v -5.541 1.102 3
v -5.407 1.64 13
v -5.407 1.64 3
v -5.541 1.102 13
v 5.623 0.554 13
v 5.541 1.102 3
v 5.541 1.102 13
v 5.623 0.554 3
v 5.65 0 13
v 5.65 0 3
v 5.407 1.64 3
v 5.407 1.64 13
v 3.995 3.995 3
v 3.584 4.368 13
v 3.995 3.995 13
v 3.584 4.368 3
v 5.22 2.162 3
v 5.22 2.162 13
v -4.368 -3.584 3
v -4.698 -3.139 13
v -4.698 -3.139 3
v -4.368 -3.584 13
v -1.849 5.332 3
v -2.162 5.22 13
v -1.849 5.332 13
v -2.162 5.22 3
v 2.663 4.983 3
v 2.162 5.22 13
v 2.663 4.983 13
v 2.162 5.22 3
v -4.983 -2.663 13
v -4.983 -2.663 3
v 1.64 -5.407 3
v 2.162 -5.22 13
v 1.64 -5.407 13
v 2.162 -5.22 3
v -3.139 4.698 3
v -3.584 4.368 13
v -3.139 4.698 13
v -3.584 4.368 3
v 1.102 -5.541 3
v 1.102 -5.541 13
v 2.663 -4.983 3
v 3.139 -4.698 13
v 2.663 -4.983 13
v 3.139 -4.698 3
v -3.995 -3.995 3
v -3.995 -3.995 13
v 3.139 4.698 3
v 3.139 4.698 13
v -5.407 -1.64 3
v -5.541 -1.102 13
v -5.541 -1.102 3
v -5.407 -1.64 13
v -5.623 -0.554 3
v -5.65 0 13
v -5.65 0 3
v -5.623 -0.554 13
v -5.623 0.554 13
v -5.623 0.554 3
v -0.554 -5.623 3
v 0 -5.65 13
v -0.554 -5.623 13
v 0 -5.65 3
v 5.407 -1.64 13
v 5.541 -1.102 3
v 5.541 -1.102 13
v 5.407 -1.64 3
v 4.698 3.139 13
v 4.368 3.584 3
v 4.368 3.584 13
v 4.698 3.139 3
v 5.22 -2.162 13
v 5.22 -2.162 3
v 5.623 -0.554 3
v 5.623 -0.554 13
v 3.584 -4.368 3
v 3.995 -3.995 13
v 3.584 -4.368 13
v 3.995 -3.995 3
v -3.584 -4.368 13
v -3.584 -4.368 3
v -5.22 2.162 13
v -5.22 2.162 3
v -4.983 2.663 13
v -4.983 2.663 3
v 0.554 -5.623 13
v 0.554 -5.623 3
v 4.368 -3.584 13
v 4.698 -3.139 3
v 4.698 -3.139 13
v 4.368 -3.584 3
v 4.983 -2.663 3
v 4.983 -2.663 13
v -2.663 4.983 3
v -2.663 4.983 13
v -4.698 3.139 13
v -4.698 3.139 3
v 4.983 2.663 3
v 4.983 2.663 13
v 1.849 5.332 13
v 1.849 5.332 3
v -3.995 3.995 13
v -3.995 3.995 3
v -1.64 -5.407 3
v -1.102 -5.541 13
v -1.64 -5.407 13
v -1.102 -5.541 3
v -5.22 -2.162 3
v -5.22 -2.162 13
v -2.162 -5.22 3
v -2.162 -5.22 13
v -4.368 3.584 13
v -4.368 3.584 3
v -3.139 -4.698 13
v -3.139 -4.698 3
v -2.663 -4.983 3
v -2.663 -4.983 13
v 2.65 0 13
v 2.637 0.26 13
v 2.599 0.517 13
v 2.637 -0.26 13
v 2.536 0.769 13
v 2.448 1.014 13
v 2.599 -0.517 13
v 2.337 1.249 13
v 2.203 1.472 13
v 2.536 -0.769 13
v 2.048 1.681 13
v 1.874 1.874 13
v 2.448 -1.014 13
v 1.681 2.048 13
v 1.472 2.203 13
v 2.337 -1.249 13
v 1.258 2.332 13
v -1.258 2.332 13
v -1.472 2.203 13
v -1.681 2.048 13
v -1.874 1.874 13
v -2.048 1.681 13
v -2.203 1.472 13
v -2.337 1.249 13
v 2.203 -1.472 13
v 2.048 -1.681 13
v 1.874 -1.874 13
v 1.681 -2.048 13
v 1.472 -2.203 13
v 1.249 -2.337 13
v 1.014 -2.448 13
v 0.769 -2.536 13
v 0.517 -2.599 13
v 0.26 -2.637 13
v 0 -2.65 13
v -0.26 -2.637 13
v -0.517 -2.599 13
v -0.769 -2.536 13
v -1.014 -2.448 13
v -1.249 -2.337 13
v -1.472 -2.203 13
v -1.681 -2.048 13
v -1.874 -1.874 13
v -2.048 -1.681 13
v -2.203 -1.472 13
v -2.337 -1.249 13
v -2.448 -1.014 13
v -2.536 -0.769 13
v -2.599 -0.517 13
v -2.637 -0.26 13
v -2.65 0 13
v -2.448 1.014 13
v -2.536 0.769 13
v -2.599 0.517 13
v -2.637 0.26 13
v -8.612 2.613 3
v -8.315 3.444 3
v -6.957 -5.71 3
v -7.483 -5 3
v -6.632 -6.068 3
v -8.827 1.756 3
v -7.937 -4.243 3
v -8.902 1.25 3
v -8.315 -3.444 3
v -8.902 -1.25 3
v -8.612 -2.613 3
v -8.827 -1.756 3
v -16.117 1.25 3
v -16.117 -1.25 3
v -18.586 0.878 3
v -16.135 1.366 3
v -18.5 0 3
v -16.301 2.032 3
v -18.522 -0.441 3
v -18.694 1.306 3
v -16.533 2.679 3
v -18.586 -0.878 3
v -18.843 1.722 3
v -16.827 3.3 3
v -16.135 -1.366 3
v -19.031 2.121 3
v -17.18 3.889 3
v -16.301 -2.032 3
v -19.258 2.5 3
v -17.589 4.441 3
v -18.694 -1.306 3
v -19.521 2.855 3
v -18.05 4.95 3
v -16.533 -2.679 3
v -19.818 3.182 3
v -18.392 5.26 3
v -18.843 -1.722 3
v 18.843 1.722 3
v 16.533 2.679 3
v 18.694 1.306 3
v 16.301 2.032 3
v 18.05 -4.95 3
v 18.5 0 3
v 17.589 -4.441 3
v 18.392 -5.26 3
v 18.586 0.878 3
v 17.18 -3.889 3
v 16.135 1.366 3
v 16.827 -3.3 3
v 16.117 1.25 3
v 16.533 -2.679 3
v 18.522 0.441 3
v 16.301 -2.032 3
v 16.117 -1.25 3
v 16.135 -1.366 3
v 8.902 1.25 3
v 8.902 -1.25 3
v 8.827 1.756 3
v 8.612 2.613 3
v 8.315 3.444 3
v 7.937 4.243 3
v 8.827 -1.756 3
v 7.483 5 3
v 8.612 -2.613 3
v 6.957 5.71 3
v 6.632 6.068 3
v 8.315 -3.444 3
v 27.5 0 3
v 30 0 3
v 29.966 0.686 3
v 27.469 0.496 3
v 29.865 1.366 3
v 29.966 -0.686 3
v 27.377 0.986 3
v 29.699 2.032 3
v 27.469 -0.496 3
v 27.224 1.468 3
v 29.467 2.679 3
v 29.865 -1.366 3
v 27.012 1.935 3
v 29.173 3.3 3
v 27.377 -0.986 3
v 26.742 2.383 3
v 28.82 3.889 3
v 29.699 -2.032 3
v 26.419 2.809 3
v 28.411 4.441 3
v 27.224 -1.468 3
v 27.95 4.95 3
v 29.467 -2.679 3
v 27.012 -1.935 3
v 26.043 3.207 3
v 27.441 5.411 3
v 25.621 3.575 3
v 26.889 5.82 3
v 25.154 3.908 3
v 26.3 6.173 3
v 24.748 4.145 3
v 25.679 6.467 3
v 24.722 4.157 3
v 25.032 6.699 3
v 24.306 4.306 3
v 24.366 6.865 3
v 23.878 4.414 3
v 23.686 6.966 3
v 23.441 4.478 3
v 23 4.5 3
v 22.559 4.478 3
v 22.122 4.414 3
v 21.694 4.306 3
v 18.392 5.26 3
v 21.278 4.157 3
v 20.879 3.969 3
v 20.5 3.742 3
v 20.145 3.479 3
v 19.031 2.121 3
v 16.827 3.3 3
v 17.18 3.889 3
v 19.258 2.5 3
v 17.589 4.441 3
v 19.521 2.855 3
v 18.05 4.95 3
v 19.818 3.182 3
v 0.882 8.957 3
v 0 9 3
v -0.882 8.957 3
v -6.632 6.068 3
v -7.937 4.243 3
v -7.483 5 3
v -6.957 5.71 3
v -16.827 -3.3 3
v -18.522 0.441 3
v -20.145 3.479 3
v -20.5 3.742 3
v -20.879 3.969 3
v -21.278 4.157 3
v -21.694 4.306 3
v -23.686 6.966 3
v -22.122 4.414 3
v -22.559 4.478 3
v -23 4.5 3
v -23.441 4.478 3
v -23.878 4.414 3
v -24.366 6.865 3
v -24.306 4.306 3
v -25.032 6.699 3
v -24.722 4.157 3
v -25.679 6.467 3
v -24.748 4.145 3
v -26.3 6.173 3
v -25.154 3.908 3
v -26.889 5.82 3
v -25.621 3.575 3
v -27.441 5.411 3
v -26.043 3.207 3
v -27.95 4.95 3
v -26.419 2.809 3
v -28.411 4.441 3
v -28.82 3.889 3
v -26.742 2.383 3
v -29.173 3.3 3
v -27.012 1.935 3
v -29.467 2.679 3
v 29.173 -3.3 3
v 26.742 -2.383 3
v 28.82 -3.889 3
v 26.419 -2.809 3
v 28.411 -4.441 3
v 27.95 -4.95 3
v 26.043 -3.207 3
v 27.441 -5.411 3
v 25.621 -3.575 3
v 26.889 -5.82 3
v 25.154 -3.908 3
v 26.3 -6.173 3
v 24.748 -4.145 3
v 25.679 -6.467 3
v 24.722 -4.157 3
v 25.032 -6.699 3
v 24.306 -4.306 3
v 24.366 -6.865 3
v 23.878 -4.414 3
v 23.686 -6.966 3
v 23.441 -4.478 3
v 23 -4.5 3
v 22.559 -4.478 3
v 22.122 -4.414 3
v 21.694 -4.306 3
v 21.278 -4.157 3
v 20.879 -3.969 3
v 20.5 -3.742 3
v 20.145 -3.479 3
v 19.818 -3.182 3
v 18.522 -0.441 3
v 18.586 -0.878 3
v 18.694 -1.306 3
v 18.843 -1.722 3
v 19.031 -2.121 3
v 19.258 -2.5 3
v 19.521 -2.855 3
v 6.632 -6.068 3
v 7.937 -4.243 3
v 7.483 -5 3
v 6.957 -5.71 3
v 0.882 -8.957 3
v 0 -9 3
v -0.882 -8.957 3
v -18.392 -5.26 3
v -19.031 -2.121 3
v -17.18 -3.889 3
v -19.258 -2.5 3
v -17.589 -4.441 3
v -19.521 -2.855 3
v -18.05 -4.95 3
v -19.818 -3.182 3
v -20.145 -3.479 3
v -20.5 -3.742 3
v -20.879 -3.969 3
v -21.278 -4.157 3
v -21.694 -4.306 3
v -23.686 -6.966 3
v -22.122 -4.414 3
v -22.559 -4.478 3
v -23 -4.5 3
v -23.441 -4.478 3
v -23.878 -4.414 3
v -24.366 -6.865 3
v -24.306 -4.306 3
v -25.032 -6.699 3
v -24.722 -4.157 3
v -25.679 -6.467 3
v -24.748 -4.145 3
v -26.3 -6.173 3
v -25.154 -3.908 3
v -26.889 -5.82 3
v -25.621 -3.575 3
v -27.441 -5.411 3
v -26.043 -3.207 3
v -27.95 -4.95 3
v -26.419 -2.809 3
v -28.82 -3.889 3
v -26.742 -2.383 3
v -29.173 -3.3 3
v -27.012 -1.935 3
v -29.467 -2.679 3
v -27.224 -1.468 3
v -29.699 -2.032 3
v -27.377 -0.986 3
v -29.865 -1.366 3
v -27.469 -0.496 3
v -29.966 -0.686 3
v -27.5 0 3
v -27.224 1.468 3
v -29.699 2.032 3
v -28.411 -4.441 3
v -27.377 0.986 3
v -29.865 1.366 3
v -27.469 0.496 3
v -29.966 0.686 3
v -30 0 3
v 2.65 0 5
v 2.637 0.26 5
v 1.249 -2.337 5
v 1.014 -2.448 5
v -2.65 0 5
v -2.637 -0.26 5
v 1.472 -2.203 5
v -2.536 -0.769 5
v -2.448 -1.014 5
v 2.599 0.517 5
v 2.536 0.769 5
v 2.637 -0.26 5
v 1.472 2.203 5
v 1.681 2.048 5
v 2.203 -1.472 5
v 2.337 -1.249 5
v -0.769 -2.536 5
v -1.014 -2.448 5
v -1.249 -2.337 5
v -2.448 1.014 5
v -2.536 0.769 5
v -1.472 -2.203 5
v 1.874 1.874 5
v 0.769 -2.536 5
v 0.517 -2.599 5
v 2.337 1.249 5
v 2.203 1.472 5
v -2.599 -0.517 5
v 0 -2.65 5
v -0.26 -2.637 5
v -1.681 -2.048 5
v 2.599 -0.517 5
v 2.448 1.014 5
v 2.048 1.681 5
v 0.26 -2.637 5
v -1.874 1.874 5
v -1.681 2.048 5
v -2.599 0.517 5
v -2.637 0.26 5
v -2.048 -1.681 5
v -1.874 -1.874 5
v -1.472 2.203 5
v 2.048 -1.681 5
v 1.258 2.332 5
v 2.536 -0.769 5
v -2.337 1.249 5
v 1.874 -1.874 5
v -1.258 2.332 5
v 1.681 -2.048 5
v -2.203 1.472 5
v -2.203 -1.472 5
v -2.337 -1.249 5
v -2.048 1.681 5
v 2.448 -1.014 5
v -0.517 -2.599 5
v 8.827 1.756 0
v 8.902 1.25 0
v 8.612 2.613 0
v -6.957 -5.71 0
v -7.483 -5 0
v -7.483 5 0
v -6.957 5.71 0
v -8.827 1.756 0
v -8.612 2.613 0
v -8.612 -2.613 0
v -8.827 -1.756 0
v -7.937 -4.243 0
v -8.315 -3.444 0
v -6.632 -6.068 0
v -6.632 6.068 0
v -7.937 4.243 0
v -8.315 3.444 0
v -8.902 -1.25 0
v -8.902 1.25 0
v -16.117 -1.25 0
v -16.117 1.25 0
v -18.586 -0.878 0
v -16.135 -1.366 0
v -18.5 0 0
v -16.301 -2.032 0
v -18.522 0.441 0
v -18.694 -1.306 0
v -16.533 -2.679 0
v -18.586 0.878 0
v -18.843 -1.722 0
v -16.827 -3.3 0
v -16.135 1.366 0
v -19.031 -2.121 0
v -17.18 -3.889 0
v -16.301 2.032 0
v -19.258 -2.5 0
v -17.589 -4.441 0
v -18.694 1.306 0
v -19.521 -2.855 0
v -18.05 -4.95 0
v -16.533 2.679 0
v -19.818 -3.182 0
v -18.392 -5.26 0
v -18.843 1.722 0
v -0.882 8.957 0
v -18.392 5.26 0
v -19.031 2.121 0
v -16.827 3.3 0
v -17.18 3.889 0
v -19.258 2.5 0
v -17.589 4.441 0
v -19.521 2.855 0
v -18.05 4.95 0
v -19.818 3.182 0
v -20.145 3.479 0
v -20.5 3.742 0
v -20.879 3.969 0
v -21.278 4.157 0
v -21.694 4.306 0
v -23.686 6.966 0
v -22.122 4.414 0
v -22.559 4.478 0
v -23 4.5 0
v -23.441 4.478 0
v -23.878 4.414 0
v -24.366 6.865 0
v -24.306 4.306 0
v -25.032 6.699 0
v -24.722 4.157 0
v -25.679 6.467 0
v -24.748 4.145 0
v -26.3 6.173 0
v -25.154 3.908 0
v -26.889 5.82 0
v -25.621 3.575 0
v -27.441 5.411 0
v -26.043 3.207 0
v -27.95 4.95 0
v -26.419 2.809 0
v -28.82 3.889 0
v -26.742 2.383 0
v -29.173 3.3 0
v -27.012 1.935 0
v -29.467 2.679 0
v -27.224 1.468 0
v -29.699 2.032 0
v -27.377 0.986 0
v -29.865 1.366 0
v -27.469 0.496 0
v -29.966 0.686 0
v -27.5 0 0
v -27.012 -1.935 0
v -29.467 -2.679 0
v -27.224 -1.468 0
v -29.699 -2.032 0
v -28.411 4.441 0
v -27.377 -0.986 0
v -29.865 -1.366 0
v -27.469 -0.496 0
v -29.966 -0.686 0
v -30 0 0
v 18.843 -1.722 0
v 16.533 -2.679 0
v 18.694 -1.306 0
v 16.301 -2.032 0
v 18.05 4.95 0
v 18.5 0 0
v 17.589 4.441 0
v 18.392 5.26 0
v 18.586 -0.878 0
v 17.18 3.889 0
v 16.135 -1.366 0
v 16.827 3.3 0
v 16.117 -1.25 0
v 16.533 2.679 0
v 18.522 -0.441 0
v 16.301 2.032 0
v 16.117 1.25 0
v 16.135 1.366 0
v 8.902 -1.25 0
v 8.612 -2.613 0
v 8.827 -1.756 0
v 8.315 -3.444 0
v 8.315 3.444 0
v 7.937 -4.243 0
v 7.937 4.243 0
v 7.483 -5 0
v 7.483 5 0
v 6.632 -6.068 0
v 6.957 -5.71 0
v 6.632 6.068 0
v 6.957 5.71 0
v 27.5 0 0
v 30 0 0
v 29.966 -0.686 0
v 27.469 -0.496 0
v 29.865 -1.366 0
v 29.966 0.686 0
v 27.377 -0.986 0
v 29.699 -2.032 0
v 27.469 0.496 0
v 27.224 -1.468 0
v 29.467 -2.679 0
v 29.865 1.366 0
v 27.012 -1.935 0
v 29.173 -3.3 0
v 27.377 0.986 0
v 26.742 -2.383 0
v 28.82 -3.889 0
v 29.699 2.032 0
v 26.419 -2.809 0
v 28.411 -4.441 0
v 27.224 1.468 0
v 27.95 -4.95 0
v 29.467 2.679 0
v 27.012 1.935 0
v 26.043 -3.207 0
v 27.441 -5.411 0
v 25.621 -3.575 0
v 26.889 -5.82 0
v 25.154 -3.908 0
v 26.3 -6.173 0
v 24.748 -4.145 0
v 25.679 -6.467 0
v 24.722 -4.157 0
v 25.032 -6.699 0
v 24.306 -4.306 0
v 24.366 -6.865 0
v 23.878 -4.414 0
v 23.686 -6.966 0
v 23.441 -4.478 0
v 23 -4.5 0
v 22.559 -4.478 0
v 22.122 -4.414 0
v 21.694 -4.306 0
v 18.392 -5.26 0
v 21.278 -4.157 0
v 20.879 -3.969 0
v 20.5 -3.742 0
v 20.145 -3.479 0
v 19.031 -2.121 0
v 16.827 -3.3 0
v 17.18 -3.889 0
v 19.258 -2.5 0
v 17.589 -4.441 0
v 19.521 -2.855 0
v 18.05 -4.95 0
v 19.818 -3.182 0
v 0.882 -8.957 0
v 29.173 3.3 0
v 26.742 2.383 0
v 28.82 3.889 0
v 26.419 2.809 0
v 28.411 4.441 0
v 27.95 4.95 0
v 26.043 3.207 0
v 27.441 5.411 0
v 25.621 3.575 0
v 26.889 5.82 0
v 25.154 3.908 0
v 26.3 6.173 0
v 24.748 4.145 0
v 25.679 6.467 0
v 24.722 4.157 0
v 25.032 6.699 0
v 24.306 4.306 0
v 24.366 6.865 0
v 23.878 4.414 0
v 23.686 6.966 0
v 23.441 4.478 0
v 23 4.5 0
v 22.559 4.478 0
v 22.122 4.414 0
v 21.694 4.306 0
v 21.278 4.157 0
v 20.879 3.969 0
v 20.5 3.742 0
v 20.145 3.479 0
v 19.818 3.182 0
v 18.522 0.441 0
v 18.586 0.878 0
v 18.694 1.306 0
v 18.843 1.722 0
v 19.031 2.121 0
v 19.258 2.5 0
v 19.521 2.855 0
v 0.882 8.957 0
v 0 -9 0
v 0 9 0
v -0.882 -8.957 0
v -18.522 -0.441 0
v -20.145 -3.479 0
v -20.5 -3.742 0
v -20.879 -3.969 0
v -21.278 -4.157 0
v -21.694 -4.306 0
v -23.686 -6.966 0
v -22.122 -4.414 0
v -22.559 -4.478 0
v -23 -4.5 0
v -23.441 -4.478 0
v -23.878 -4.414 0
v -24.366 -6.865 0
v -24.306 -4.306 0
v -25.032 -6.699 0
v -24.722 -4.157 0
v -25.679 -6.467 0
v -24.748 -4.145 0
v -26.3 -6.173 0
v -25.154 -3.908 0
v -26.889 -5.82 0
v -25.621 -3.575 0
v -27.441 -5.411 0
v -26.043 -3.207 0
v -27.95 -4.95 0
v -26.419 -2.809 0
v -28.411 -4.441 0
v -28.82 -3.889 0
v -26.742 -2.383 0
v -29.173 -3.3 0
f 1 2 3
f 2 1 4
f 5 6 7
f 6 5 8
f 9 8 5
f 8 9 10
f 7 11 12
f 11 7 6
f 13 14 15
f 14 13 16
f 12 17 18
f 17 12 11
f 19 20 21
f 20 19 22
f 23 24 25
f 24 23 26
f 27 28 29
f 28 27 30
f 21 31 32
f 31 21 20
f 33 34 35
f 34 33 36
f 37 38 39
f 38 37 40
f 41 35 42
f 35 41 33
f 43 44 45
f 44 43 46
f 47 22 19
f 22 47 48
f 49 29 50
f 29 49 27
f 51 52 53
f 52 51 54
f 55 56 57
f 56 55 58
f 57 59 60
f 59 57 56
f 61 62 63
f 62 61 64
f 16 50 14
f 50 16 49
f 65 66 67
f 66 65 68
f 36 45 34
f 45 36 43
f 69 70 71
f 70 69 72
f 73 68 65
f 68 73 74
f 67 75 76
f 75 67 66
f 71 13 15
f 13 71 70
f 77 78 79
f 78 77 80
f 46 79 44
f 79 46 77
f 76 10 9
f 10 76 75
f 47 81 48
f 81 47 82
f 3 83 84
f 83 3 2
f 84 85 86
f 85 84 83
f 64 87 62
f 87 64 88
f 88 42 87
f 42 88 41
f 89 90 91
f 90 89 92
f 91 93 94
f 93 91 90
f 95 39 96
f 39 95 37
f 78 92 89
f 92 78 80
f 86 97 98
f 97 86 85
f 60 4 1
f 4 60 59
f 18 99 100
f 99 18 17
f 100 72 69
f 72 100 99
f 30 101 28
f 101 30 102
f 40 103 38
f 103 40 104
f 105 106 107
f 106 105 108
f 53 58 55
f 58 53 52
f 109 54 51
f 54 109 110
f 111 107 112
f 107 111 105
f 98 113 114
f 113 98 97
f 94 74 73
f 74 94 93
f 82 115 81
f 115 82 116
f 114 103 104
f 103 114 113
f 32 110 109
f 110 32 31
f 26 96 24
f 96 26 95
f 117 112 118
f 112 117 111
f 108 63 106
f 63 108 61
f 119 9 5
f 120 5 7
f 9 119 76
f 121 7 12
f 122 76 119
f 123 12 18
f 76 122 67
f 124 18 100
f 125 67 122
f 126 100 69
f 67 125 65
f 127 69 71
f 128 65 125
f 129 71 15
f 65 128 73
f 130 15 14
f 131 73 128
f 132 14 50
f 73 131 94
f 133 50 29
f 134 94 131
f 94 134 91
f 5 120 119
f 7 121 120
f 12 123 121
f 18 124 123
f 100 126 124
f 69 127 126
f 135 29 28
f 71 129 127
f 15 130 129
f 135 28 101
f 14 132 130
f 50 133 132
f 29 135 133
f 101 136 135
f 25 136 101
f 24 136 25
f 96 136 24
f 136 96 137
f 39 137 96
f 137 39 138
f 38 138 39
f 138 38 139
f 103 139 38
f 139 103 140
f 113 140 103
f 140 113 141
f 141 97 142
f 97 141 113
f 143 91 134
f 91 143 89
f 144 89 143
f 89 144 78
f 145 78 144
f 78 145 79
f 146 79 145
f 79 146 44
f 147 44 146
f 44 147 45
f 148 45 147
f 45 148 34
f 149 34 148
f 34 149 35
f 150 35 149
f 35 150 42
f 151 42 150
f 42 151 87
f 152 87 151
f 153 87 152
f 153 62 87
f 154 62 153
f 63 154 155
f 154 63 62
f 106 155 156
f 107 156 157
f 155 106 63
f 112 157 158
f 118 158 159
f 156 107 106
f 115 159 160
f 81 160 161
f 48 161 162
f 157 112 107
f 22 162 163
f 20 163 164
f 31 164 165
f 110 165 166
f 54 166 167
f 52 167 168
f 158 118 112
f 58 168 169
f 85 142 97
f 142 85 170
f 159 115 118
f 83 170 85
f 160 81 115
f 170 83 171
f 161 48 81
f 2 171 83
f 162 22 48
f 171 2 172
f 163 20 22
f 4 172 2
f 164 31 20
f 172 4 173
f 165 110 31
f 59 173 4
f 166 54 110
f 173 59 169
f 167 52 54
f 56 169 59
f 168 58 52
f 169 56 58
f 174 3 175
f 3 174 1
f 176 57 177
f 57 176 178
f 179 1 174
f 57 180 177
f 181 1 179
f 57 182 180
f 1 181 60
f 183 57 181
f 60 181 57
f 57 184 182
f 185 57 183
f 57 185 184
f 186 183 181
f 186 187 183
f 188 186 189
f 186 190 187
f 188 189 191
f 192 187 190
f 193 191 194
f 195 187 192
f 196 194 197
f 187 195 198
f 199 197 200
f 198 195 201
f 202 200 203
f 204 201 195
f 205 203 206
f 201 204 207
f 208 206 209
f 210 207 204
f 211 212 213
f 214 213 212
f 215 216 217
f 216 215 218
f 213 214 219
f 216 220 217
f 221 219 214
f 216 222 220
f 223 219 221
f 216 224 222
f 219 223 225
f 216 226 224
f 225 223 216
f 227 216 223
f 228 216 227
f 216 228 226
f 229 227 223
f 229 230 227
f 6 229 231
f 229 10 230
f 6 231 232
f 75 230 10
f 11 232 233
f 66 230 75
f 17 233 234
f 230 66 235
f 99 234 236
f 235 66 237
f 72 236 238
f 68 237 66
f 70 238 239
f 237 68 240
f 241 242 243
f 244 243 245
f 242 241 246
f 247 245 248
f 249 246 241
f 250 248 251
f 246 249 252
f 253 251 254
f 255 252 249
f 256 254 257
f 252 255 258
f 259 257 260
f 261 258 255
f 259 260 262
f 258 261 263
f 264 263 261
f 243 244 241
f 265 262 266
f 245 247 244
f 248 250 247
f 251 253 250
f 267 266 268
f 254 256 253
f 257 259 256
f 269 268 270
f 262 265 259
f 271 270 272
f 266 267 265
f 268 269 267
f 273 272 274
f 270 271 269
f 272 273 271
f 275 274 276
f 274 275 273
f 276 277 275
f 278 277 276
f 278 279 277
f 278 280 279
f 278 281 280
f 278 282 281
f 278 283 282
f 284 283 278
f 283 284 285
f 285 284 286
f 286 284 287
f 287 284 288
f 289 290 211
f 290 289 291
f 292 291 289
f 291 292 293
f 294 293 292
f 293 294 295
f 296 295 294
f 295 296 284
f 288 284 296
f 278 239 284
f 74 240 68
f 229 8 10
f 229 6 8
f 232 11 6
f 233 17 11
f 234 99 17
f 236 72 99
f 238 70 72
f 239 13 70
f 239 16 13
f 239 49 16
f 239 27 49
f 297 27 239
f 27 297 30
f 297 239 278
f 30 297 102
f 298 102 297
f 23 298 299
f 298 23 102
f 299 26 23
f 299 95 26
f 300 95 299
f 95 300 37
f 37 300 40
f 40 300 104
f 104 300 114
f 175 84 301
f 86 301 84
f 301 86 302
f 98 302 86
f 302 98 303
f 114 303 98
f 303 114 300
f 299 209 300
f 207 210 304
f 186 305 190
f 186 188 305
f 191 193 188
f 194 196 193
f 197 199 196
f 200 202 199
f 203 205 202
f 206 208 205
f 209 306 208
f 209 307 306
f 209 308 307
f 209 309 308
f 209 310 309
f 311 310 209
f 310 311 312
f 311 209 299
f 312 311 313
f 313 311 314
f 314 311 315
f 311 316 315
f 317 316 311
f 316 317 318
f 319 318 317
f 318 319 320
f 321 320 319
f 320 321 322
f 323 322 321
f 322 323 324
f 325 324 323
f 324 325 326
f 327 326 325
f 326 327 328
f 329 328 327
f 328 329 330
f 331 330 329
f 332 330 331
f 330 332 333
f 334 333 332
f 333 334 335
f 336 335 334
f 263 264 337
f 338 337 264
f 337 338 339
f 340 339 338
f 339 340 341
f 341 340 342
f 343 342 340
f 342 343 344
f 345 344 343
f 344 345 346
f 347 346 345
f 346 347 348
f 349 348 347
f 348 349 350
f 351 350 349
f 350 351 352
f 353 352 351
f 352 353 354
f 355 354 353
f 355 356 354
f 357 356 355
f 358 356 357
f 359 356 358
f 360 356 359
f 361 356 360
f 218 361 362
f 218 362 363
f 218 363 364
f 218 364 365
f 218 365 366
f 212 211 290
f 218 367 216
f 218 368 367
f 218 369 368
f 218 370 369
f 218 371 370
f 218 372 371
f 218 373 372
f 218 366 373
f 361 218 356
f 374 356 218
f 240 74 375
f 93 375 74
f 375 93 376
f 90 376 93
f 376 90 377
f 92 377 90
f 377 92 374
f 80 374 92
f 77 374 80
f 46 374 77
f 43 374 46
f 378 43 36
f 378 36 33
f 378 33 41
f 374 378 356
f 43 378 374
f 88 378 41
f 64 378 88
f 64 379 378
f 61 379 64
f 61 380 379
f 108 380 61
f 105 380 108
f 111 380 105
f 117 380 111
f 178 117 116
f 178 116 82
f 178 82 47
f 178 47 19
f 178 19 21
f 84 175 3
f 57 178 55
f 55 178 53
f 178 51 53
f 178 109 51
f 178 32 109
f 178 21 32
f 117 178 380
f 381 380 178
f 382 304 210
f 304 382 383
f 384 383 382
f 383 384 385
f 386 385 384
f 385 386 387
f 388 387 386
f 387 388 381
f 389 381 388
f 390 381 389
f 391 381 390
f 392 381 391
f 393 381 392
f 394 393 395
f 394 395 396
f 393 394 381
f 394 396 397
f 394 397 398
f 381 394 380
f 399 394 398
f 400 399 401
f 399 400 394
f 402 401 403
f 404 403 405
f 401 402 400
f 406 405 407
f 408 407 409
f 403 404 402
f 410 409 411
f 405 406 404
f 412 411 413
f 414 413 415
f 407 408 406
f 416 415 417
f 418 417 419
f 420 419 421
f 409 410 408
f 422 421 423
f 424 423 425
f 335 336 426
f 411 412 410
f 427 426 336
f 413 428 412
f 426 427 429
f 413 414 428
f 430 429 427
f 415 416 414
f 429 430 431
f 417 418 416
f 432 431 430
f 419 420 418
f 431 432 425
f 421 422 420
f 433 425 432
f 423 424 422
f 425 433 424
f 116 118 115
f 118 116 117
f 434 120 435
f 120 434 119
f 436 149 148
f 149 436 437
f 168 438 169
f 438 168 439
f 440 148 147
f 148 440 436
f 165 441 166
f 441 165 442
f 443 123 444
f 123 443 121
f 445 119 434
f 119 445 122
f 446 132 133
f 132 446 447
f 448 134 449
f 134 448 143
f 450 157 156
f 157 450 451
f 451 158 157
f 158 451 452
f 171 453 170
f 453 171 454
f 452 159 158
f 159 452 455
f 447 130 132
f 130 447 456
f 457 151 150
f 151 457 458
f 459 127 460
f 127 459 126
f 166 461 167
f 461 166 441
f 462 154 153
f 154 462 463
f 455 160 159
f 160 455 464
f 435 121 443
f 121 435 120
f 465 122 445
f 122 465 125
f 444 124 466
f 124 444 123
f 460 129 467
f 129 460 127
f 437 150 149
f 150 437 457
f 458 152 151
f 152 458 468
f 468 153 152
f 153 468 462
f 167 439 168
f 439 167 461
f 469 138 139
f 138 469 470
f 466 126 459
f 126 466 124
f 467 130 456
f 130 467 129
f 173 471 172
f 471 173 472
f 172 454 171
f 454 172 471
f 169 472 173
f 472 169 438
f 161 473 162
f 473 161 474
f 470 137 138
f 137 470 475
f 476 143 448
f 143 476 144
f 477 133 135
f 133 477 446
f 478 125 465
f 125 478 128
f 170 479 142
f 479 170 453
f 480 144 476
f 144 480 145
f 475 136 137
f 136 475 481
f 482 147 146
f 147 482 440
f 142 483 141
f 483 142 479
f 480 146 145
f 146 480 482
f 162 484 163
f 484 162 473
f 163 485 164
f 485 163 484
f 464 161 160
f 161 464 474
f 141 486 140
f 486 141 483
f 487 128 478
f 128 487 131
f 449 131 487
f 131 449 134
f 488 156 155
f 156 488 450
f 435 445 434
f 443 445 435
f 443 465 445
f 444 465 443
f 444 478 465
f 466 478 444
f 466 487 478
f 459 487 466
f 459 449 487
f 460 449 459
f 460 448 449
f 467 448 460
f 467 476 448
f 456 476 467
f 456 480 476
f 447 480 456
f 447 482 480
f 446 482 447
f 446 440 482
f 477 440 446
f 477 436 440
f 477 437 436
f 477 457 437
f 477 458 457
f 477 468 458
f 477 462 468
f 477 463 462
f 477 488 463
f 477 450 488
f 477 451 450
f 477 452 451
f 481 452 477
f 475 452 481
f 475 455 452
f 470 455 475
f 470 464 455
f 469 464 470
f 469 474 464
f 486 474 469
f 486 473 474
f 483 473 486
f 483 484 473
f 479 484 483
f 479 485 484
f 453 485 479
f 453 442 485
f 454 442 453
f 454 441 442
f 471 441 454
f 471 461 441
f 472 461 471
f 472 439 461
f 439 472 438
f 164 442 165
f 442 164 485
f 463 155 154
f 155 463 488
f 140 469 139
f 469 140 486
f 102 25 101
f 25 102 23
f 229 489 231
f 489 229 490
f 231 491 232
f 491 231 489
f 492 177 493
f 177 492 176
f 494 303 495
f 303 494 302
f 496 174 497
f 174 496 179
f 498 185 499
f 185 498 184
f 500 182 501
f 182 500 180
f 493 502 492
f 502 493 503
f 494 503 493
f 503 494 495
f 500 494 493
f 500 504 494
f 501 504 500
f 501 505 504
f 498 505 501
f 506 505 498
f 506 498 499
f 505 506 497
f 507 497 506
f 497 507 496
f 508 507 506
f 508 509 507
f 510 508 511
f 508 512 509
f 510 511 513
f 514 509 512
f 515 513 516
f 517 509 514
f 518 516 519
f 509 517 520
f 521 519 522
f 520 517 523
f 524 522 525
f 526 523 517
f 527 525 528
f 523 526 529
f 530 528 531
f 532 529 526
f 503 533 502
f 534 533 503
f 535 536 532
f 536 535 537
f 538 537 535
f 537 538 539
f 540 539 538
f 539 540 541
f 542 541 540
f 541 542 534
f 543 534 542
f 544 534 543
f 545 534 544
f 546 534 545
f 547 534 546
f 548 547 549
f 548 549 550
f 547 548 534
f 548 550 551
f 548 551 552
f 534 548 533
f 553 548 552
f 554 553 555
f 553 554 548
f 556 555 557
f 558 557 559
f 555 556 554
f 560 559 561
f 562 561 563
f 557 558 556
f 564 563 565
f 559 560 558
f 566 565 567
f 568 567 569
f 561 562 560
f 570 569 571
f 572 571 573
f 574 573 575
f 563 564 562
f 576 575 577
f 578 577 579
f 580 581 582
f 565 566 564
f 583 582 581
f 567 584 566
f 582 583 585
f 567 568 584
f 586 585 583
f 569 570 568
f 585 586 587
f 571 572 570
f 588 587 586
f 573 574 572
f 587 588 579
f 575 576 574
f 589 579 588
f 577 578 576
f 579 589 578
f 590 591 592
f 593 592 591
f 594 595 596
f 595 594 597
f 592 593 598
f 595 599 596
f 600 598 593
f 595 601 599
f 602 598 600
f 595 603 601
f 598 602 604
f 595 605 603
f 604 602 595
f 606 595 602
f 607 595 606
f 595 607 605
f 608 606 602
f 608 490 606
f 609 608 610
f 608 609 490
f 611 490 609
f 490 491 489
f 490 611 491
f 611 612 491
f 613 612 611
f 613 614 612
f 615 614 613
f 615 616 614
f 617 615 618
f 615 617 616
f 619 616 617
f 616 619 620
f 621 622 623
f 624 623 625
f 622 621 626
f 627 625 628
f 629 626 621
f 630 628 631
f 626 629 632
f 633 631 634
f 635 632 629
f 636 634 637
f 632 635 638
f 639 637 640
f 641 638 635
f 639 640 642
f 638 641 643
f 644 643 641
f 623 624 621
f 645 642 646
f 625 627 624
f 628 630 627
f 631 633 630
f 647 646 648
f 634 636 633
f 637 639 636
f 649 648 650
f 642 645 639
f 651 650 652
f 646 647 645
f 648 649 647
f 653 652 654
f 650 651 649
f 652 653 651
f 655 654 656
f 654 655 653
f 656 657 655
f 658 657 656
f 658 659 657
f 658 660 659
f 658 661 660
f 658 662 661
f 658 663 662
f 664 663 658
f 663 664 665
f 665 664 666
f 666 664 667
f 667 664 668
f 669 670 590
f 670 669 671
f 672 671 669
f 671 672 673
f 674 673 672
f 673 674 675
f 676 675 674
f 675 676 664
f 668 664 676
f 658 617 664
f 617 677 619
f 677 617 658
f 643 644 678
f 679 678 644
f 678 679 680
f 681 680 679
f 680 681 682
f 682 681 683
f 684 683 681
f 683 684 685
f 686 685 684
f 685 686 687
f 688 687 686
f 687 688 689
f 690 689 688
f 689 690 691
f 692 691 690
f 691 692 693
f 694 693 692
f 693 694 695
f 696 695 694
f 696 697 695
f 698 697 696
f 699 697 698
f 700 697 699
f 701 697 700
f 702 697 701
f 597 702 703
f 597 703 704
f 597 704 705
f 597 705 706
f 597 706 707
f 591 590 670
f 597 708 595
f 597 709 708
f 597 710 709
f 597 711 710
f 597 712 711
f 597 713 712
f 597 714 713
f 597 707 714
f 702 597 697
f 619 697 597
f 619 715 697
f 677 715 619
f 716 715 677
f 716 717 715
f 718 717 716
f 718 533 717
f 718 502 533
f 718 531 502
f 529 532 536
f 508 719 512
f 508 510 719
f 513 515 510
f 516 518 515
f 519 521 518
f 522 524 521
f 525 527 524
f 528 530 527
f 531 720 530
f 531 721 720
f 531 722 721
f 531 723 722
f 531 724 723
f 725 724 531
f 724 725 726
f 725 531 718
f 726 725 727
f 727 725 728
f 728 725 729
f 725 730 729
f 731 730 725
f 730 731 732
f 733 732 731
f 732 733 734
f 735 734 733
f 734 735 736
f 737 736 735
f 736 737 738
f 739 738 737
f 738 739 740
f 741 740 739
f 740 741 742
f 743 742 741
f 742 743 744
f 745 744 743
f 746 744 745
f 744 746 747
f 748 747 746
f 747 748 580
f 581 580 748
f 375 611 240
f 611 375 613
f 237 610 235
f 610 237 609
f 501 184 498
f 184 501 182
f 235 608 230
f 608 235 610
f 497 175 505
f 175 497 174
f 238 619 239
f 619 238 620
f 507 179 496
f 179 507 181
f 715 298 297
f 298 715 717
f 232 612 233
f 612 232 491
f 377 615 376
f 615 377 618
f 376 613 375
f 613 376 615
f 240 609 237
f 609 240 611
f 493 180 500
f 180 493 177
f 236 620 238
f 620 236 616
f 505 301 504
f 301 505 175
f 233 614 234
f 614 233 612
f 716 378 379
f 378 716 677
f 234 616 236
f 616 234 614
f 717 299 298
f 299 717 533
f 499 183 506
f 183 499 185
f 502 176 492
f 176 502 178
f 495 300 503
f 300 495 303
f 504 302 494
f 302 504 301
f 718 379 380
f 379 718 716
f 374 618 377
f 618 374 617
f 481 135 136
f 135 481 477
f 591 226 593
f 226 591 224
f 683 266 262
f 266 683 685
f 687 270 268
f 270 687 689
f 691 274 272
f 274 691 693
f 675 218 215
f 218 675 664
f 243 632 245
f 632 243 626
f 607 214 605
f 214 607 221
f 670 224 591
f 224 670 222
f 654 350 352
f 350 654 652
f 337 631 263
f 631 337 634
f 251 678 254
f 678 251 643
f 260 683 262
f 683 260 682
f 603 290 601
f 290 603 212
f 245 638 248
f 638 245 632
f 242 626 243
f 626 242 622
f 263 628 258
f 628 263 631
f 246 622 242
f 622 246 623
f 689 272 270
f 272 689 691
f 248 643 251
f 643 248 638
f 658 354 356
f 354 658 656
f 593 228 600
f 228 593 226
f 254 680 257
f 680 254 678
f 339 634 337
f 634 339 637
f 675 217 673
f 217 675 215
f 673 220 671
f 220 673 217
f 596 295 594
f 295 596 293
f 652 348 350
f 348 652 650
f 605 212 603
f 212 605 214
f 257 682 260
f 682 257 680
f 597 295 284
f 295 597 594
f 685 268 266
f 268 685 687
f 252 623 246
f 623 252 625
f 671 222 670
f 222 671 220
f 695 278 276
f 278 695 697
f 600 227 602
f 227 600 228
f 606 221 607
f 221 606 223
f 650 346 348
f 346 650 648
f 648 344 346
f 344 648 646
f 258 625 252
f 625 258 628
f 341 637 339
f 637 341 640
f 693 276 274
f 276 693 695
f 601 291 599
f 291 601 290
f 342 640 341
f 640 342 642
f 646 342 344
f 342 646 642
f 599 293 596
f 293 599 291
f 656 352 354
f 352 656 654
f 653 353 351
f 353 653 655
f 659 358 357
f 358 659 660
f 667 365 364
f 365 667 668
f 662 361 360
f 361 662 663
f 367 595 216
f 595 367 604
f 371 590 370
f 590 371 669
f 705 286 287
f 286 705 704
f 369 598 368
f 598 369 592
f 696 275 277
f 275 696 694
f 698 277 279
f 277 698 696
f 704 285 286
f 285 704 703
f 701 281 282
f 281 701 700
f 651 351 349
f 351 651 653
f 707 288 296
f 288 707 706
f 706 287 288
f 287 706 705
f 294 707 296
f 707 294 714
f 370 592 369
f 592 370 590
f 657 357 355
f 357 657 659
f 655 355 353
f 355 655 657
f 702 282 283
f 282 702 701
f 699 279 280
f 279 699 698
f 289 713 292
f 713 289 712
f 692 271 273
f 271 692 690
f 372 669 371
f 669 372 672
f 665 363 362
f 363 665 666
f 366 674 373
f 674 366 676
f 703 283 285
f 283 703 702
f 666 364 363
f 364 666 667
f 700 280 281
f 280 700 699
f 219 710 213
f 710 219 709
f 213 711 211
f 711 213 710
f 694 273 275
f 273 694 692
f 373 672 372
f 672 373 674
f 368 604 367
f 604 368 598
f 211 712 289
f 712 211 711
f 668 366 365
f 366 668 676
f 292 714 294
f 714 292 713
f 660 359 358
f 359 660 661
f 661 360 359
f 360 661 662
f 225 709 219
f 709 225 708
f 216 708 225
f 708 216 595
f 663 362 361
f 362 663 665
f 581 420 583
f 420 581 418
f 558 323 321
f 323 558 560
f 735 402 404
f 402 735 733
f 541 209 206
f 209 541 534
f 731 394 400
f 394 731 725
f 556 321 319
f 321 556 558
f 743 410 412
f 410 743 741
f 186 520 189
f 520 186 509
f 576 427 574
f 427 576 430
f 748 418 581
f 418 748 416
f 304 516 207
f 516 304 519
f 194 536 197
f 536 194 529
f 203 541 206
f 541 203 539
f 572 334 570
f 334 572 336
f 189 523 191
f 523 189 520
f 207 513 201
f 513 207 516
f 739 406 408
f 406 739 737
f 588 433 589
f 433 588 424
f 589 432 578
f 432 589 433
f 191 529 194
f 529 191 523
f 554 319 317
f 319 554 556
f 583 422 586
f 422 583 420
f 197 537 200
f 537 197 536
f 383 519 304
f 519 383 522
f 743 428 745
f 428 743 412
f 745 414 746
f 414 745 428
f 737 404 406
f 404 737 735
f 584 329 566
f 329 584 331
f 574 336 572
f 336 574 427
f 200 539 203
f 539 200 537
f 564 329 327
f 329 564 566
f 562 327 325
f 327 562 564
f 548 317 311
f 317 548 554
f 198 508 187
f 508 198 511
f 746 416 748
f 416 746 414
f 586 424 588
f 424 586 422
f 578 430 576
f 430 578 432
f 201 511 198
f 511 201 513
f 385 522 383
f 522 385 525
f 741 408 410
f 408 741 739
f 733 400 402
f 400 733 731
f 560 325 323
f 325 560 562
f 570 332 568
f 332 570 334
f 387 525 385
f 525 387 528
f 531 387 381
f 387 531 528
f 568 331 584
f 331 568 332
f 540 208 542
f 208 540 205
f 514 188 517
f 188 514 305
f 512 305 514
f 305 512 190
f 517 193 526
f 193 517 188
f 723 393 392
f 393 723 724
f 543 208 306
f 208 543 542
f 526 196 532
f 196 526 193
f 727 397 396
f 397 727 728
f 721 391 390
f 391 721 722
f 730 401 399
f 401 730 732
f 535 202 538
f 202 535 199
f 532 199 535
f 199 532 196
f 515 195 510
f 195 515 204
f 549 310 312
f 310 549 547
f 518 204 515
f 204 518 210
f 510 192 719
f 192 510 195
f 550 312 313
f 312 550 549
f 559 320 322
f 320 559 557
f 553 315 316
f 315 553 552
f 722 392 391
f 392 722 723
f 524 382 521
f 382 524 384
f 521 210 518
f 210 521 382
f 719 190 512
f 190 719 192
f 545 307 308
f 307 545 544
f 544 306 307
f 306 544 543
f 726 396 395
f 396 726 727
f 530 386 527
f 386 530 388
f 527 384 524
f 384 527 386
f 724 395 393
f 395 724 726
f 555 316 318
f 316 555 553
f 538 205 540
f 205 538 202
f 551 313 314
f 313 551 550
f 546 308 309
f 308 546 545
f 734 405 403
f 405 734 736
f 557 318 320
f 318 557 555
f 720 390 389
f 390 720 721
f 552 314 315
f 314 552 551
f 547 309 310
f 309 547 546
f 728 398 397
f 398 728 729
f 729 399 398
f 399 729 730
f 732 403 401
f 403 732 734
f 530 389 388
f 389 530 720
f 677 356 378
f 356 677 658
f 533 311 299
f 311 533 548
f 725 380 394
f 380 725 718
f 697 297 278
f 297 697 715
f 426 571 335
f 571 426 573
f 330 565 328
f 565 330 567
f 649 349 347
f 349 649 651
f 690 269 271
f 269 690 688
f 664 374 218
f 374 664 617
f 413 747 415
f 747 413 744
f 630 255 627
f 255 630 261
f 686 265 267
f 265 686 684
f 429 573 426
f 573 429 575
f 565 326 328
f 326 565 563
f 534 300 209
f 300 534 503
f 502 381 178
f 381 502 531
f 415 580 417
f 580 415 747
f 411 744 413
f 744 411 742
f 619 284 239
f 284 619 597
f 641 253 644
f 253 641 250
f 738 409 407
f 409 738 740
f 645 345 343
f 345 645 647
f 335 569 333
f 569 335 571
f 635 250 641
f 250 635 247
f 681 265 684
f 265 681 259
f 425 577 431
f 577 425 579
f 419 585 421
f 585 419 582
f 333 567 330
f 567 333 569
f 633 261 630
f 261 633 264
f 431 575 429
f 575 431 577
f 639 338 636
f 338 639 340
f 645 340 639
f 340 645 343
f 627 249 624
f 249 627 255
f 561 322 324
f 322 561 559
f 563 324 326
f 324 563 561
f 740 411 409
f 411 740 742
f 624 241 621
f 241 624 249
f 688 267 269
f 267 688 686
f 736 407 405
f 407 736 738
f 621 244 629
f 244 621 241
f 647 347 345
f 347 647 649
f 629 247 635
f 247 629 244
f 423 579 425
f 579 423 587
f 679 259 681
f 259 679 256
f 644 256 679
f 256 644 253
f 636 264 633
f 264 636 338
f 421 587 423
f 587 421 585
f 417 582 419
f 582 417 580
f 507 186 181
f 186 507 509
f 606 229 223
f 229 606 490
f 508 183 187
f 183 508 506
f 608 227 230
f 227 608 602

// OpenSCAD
// Author: GrAndAG
// This is a remix of Stepper Shaft Key (http://www.thingiverse.com/thing:567784),
// redesigned for customizer


/* [Size] */
// Length of the handle (mm)
length = 60;
// Diameter of central ring (mm)
center_diameter = 18;
// Height og the thing (mm)
height = 13;
// Diameter of two rings at the ends (mm)
rings_diameter = 14;
// Diameter of hole for shaft (mm)
hole_diameter = 5.3;

/* [Thickness] */
// Thickness of handle (mm)
thickness = 3;
// Width of frames (mm)
frame_width = 2.5;
// Thickness of walls around shaft (mm)
hole_wall_thickness = 3;

/* [Hidden] */
$fn = 64;
eps = 0.05;
depth = height - thickness;

module key(size) {
	key_size = hole_diameter - (hole_diameter*4.7/5);
	
	// center
	union() {
		cylinder(d = center_diameter, h = thickness);
		difference() {
  			translate([ 0, 0, thickness]) 
				cylinder(d=hole_diameter+hole_wall_thickness*2,h=depth);
  			translate([ 0, 0, thickness+2]) 
				cylinder(d=hole_diameter, h=depth-2+eps);
	  		translate([-(hole_diameter+hole_wall_thickness*2)/2, hole_diameter/2+hole_wall_thickness-key_size, thickness]) 
				cube([hole_diameter+6 ,2 ,depth+eps]);
		}
		translate([-hole_diameter/2+key_size, hole_diameter/2-key_size, thickness]) 
			cube([hole_diameter-key_size*2, hole_wall_thickness/2, depth]);
	}

	module ring() {
		difference() {
  			cylinder(d=rings_diameter, h=thickness);
			translate([0,0,-eps/2]) 
				cylinder(d=rings_diameter-2*frame_width, h=thickness+eps);
		}
	}

	// two ringz
	translate([+(size-rings_diameter)/2, 0, 0]) 
		ring();
	translate([-(size-rings_diameter)/2, 0, 0]) 
		ring();

	// central frame
	c_len = size-2*(rings_diameter-frame_width/2);
	translate([-c_len/2, -frame_width/2, 0]) 
		cube([c_len, frame_width, thickness]);

	// walls
	w_len = size-rings_diameter;
	module obj() {
		hull() {
			translate([+(size-rings_diameter)/2, 0, 0]) 
				ring();
			translate([-(size-rings_diameter)/2, 0, 0]) 
				ring();
			cylinder(d = center_diameter, h = thickness);
		}
	}
	difference() {
		obj();
		translate([0, 0,-eps/2]) 
			resize([size-frame_width*2, center_diameter-frame_width*2, thickness + eps]) 
				obj();
	}
}

key(length);
